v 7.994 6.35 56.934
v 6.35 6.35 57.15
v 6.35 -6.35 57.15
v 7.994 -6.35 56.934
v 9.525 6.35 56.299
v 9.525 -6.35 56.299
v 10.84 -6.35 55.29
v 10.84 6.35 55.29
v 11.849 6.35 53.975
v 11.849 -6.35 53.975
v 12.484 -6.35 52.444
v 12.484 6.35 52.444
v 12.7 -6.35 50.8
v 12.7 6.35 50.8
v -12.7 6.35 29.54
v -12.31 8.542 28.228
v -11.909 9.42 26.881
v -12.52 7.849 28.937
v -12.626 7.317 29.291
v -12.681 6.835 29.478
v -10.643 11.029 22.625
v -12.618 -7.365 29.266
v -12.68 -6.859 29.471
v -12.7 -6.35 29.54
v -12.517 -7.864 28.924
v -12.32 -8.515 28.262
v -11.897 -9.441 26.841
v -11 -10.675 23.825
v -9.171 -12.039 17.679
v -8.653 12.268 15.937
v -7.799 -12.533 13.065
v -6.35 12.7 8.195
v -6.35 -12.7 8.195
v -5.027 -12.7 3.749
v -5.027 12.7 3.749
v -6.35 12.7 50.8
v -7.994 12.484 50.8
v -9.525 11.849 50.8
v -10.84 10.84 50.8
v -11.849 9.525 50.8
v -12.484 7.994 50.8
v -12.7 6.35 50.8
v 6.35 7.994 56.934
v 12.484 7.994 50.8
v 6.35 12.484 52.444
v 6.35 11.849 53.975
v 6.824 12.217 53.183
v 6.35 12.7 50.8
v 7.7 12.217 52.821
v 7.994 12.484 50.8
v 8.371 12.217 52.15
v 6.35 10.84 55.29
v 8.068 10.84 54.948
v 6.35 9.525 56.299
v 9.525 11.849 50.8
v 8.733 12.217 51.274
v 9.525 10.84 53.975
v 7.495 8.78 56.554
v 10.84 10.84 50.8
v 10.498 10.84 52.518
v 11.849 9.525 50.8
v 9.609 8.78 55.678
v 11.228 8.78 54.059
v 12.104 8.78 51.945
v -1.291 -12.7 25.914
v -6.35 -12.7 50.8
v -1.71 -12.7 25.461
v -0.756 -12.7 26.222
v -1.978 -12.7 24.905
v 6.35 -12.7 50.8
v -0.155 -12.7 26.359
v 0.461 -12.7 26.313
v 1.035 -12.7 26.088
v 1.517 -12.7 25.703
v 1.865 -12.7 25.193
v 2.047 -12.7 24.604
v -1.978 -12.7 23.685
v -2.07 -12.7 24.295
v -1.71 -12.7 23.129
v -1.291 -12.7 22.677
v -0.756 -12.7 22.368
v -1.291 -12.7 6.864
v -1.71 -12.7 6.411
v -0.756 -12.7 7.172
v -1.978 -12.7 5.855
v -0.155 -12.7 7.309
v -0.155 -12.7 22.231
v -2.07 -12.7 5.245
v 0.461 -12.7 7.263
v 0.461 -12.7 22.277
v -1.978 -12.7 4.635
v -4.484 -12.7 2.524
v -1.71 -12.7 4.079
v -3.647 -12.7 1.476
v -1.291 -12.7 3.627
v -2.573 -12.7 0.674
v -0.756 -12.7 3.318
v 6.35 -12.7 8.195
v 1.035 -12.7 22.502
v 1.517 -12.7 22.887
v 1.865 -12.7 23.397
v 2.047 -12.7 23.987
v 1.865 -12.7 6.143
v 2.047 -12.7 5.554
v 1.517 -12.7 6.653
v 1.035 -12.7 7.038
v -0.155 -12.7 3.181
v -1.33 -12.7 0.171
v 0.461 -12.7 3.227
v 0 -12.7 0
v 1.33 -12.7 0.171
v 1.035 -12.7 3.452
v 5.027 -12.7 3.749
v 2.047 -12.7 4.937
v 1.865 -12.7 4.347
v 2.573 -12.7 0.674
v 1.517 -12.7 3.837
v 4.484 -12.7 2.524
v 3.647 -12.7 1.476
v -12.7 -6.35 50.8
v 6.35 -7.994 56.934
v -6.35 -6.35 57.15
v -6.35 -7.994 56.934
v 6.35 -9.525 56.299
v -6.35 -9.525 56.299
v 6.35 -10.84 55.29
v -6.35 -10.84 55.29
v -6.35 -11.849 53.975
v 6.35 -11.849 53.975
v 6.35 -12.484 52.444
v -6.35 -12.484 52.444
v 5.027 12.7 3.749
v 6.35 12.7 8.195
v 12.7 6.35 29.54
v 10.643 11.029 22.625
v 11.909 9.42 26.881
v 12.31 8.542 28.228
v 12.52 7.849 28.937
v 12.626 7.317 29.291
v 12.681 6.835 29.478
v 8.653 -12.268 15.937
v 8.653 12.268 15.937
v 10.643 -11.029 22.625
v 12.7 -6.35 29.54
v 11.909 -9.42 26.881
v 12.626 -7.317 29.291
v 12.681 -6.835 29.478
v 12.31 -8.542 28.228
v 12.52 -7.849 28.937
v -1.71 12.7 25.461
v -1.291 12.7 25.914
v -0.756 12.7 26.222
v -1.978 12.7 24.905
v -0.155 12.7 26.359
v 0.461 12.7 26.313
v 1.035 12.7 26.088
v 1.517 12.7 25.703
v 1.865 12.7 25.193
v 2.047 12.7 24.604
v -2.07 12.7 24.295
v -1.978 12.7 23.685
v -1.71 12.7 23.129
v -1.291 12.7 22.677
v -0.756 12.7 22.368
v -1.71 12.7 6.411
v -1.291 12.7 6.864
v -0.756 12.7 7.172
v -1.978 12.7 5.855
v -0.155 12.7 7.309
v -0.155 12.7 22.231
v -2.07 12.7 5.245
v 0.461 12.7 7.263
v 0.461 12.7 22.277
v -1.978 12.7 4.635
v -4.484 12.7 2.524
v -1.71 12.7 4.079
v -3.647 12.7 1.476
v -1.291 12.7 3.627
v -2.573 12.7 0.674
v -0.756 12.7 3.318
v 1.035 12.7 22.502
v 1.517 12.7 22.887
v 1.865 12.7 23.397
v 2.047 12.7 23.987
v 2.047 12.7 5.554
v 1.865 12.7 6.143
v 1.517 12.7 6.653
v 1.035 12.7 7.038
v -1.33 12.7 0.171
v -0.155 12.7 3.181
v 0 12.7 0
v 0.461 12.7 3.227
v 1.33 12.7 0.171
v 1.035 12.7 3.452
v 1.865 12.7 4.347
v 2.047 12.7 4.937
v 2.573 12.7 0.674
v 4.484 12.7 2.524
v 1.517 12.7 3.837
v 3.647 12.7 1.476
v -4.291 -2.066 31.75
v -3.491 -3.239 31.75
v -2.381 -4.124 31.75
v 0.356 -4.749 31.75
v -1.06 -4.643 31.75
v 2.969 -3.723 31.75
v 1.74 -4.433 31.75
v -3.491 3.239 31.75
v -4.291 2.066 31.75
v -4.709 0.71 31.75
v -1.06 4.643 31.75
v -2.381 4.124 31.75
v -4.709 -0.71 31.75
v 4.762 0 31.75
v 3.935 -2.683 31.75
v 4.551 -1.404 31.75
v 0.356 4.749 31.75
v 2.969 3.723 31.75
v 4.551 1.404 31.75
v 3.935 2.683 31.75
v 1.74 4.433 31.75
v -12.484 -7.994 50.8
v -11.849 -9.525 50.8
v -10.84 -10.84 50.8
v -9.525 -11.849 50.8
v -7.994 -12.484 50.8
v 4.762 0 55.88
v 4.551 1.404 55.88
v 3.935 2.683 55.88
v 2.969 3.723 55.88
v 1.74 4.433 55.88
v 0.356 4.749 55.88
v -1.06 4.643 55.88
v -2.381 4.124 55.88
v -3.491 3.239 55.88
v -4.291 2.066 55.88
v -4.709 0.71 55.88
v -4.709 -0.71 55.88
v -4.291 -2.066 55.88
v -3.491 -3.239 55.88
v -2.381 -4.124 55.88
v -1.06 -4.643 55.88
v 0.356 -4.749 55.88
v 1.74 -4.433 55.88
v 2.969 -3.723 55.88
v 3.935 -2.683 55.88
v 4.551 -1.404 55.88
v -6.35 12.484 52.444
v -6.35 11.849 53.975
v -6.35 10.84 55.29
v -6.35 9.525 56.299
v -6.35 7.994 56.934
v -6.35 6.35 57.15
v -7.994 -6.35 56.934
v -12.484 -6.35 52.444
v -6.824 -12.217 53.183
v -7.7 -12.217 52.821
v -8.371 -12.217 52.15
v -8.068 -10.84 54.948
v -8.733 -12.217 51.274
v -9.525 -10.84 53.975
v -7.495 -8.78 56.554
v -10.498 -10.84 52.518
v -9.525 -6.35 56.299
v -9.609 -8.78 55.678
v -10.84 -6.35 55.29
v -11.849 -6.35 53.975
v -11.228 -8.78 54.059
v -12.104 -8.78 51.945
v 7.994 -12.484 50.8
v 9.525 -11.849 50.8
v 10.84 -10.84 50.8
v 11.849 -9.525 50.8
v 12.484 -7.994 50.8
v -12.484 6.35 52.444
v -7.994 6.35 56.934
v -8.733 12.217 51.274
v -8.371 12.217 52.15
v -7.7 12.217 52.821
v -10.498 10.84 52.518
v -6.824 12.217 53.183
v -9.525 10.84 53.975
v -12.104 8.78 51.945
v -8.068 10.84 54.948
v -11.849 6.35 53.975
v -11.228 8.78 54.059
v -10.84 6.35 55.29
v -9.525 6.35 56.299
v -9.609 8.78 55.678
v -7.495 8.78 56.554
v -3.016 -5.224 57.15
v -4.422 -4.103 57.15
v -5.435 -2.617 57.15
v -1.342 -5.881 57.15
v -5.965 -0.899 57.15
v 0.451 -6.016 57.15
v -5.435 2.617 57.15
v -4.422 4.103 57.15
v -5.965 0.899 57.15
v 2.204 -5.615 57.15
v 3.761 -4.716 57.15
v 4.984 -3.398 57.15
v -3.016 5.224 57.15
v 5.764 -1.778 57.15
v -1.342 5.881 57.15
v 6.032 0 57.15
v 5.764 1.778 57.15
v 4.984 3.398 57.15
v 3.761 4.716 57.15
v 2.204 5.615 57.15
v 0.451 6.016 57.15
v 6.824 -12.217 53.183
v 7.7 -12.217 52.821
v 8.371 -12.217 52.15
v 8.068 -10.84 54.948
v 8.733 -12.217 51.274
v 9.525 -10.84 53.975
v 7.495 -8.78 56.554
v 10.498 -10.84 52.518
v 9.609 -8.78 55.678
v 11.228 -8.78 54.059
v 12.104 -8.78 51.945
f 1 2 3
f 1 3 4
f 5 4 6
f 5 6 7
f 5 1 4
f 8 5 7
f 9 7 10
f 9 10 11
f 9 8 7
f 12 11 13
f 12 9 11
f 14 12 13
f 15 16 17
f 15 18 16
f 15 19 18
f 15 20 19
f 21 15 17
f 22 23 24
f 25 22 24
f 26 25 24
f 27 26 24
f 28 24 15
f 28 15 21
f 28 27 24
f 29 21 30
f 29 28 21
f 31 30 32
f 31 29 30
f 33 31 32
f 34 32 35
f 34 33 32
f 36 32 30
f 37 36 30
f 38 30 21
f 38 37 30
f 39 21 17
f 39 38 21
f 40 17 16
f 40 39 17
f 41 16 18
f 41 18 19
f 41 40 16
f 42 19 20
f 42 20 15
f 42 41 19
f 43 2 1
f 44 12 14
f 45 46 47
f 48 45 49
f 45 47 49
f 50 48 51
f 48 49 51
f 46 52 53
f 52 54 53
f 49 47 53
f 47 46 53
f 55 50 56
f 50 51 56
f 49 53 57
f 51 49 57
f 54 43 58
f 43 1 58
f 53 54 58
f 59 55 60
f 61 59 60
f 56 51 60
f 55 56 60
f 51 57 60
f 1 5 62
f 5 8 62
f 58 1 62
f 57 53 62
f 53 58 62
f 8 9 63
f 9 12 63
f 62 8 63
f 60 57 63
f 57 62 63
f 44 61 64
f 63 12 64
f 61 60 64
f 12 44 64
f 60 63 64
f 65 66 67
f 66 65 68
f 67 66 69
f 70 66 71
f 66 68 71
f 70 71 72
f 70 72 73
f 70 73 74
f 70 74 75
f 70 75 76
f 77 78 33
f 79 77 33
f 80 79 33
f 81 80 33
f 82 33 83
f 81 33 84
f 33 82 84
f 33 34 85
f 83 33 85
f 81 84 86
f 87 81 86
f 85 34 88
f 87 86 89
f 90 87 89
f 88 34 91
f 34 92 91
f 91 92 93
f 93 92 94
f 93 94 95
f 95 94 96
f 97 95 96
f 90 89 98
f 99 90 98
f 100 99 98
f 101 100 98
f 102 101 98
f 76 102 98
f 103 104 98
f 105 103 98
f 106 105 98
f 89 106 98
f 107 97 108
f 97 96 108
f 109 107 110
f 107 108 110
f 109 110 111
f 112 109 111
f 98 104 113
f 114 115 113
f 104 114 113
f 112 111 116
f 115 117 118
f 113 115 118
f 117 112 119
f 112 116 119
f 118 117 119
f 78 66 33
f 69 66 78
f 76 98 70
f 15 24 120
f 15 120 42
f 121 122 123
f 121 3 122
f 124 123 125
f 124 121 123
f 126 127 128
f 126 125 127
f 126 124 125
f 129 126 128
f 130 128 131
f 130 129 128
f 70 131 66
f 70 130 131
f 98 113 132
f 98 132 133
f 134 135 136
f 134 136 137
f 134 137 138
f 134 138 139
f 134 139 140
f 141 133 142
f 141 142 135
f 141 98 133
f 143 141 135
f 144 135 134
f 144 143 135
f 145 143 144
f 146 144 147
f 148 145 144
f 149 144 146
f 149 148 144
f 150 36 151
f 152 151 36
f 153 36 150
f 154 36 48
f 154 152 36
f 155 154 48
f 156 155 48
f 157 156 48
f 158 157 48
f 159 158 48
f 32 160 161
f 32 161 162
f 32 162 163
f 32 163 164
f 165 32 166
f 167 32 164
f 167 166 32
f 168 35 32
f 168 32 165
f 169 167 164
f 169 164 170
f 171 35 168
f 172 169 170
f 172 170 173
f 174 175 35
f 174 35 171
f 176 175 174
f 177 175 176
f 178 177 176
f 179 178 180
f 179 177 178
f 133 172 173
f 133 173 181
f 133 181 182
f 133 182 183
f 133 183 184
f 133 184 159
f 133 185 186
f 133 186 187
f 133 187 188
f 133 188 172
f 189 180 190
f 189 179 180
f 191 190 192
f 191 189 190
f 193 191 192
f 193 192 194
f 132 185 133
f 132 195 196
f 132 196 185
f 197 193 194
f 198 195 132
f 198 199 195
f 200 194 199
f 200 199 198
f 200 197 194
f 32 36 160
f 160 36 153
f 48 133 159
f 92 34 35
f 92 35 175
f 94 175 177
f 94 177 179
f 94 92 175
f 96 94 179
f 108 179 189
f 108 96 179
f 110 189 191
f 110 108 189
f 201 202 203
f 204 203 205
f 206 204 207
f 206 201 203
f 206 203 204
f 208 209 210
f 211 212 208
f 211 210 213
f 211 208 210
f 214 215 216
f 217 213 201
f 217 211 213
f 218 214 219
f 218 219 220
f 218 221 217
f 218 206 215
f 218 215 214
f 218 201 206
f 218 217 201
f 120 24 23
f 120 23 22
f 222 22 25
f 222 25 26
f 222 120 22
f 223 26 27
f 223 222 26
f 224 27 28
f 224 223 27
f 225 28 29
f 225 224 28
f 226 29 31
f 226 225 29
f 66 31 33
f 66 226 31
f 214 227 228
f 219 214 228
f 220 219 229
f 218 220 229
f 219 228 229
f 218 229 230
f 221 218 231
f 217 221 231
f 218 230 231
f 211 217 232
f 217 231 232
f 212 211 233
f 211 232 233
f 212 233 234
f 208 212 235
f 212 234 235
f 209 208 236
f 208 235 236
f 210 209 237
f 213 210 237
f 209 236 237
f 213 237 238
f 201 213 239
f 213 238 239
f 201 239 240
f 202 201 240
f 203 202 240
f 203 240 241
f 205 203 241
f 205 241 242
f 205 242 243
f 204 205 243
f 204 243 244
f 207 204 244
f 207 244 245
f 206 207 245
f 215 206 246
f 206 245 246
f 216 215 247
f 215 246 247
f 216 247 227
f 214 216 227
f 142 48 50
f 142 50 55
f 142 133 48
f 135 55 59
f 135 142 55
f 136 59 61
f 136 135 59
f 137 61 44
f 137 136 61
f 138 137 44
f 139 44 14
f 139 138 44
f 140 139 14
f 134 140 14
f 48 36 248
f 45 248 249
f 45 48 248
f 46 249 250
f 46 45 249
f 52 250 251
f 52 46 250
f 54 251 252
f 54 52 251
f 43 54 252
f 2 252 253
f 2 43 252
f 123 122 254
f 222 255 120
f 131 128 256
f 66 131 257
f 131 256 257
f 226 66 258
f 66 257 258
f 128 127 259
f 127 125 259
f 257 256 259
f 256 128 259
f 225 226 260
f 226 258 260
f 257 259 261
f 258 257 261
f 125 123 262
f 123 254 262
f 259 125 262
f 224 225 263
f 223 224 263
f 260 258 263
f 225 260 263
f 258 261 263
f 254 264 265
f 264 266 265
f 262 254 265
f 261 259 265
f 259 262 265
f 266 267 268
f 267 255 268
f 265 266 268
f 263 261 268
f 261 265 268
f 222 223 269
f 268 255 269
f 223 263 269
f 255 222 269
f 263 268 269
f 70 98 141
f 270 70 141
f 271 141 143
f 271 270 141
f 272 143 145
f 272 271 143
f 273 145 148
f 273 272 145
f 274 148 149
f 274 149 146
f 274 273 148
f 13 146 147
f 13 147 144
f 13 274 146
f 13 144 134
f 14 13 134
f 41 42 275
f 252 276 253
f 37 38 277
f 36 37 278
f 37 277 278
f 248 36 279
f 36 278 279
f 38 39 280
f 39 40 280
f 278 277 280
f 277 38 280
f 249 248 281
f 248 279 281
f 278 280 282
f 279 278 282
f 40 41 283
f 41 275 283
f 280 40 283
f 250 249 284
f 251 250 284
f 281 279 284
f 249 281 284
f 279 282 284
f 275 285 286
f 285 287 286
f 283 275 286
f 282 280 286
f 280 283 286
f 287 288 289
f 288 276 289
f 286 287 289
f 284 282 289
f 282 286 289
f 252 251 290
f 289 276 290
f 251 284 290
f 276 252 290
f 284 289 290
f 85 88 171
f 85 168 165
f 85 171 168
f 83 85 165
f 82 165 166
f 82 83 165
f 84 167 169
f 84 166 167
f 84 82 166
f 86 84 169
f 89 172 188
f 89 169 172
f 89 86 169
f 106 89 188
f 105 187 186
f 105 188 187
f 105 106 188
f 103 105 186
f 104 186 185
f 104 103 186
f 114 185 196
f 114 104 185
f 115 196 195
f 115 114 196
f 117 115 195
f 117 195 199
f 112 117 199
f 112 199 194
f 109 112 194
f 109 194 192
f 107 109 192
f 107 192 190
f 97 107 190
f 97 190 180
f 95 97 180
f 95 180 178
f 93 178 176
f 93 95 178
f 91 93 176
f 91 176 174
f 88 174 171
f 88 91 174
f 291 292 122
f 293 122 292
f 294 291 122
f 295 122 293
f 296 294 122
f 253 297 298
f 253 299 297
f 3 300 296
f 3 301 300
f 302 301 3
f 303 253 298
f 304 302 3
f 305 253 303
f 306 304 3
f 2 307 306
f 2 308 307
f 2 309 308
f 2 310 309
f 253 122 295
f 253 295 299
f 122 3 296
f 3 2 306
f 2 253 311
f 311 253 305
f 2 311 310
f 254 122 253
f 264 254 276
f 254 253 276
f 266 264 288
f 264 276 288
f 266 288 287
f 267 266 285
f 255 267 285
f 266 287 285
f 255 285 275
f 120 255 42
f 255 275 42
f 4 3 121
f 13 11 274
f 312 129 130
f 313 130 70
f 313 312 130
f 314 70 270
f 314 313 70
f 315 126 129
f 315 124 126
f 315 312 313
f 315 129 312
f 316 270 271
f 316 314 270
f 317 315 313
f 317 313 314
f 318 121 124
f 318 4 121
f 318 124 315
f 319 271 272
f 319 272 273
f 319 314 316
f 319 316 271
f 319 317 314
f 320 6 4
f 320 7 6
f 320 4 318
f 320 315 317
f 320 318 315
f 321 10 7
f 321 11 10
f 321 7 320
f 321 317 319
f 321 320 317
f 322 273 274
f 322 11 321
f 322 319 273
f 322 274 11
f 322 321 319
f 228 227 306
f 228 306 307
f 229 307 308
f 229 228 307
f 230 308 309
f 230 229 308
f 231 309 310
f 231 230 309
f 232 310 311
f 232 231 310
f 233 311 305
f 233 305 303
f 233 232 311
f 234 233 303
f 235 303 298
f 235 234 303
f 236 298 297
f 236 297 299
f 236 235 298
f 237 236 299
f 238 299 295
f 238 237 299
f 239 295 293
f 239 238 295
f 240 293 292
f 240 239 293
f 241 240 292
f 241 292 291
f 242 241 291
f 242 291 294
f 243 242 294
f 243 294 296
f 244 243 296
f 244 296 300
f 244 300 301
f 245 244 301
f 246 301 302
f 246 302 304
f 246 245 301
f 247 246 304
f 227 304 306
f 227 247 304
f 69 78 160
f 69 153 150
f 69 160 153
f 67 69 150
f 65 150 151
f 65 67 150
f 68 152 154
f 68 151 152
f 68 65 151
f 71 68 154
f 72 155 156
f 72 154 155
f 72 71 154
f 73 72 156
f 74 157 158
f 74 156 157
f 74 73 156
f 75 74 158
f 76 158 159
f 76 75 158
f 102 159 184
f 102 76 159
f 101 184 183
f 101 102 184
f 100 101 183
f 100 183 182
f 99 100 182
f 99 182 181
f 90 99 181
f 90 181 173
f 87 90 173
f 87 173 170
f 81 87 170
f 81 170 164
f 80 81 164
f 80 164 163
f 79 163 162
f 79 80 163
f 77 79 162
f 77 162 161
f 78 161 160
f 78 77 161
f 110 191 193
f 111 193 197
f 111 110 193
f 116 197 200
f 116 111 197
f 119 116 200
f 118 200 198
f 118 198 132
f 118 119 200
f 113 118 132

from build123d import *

# Parameters (mm, degrees)
SKETCH1_W               = 25.4
SKETCH1_H               = 25.4
BOSS_EXTRUDE1_DEPTH     = 57.15
CUT_EXTRUDE1_DEPTH      = 64.816710194
CUT_EXTRUDE1_DEPTH_BACK = 64.816710194
SKETCH2_R               = 2.0701
SKETCH4_R               = 4.7625
CUT_EXTRUDE2_DEPTH      = 25.4
CHAMFER1_SIZE           = 1.27
FILLET1_R               = 6.35
FILLET2_R               = 6.35


with BuildPart() as part:
    # Sketch1 → Boss-Extrude1 (new body)
    with BuildSketch(Plane.XY):
        Rectangle(SKETCH1_W, SKETCH1_H)
    extrude(amount=BOSS_EXTRUDE1_DEPTH)

    # Sketch2 → Cut-Extrude1 (cut, two sides: drawn at the far end of the back side and taken through both)
    with BuildSketch(Plane(origin=(0, 12.7, 0), x_dir=(1, 0, 0), z_dir=(0, 1, 0)).offset(-CUT_EXTRUDE1_DEPTH_BACK)):
        with BuildLine():
            Line((-12.7, 0), (-12.7, -29.5402))
            Line((-12.7, -29.5402), (-5.027345066, -3.749481199))
            ThreePointArc((-5.027345066, -3.749481199), (-3.135793664, -1.040593833), (7e-09, 0))
            Line((7e-09, 0), (-12.7, 0))
        make_face()
        with BuildLine():
            Line((5.027345066, -3.749481199), (12.7, -29.5402))
            Line((12.7, -29.5402), (12.7, 0))
            Line((12.7, 0), (7e-09, 0))
            ThreePointArc((7e-09, 0), (3.135793669, -1.040593837), (5.027345066, -3.749481199))
        make_face()
        with Locations(Location((0, -5.2451, 0), (0, 0, 180))):
            Circle(SKETCH2_R)
        with Locations(Location((0, -24.2951, 0), (0, 0, 180))):
            Circle(SKETCH2_R)
    extrude(amount=CUT_EXTRUDE1_DEPTH + CUT_EXTRUDE1_DEPTH_BACK, mode=Mode.SUBTRACT)

    # Sketch4 → Cut-Extrude2 (cut)
    with BuildSketch(Plane.XY.offset(57.15)):
        Circle(SKETCH4_R)
    extrude(amount=-CUT_EXTRUDE2_DEPTH, mode=Mode.SUBTRACT)

    # Chamfer1
    chamfer1_edges = [part.edges().sort_by_distance(p)[0] for p in [
        (-4.7625, 0, 57.15),
    ]]
    chamfer(chamfer1_edges, length=CHAMFER1_SIZE)

    # Fillet1
    fillet1_edges = [part.edges().sort_by_distance(p)[0] for p in [
        (12.7, 0, 57.15),
        (-12.7, 0, 57.15),
        (0, -12.7, 57.15),
        (12.7, -12.7, 43.3451),
        (-12.7, -12.7, 43.3451),
    ]]
    fillet(fillet1_edges, radius=FILLET1_R)

    # Fillet2
    fillet2_edges = [part.edges().sort_by_distance(p)[0] for p in [
        (-12.7, 12.7, 40.1701),
        (12.7, 12.7, 40.1701),
        (0, 12.7, 57.15),
        (10.840128061, 12.7, 55.290128061),
        (-10.840128061, 12.7, 55.290128061),
    ]]
    fillet(fillet2_edges, radius=FILLET2_R)


solid = part.part
